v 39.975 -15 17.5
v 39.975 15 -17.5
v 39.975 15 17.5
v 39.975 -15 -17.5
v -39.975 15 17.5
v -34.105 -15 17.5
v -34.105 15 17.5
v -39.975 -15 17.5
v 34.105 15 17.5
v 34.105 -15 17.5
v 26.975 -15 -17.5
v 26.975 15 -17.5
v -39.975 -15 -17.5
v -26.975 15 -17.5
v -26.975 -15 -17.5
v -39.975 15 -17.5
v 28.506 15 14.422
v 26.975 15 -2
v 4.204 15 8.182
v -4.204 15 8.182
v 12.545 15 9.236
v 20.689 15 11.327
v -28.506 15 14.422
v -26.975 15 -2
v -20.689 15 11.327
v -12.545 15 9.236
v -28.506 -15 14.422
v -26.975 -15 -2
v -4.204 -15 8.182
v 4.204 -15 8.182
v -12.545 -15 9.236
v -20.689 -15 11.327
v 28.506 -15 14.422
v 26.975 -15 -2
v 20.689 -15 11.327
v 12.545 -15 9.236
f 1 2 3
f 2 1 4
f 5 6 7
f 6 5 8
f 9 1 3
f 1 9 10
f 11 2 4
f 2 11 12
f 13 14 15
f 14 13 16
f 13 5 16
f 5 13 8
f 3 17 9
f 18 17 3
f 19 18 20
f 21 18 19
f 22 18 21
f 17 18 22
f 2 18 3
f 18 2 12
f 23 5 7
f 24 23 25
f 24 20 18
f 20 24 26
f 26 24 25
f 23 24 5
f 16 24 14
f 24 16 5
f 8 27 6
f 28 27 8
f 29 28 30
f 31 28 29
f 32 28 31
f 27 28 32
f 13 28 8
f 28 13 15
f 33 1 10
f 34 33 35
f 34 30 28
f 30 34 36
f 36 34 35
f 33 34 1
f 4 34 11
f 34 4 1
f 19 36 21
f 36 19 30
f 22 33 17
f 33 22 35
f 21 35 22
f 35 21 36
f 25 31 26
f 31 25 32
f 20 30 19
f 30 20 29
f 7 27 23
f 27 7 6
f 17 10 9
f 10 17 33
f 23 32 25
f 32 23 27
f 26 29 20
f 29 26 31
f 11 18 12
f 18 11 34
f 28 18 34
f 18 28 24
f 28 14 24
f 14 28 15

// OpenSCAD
$fn=50;

support_width = 130;
support_length = 50;
support_height = 25;

difference(){
cube([support_width*0.615,support_length*0.6,support_length*0.7],true);

translate([0,0,75])rotate([90,0,0])cylinder(h=support_length,r=support_width*0.515, center=true);
translate([0,0,-10])cube([support_width*0.415,support_length*0.62,support_length*0.32],true);
}
